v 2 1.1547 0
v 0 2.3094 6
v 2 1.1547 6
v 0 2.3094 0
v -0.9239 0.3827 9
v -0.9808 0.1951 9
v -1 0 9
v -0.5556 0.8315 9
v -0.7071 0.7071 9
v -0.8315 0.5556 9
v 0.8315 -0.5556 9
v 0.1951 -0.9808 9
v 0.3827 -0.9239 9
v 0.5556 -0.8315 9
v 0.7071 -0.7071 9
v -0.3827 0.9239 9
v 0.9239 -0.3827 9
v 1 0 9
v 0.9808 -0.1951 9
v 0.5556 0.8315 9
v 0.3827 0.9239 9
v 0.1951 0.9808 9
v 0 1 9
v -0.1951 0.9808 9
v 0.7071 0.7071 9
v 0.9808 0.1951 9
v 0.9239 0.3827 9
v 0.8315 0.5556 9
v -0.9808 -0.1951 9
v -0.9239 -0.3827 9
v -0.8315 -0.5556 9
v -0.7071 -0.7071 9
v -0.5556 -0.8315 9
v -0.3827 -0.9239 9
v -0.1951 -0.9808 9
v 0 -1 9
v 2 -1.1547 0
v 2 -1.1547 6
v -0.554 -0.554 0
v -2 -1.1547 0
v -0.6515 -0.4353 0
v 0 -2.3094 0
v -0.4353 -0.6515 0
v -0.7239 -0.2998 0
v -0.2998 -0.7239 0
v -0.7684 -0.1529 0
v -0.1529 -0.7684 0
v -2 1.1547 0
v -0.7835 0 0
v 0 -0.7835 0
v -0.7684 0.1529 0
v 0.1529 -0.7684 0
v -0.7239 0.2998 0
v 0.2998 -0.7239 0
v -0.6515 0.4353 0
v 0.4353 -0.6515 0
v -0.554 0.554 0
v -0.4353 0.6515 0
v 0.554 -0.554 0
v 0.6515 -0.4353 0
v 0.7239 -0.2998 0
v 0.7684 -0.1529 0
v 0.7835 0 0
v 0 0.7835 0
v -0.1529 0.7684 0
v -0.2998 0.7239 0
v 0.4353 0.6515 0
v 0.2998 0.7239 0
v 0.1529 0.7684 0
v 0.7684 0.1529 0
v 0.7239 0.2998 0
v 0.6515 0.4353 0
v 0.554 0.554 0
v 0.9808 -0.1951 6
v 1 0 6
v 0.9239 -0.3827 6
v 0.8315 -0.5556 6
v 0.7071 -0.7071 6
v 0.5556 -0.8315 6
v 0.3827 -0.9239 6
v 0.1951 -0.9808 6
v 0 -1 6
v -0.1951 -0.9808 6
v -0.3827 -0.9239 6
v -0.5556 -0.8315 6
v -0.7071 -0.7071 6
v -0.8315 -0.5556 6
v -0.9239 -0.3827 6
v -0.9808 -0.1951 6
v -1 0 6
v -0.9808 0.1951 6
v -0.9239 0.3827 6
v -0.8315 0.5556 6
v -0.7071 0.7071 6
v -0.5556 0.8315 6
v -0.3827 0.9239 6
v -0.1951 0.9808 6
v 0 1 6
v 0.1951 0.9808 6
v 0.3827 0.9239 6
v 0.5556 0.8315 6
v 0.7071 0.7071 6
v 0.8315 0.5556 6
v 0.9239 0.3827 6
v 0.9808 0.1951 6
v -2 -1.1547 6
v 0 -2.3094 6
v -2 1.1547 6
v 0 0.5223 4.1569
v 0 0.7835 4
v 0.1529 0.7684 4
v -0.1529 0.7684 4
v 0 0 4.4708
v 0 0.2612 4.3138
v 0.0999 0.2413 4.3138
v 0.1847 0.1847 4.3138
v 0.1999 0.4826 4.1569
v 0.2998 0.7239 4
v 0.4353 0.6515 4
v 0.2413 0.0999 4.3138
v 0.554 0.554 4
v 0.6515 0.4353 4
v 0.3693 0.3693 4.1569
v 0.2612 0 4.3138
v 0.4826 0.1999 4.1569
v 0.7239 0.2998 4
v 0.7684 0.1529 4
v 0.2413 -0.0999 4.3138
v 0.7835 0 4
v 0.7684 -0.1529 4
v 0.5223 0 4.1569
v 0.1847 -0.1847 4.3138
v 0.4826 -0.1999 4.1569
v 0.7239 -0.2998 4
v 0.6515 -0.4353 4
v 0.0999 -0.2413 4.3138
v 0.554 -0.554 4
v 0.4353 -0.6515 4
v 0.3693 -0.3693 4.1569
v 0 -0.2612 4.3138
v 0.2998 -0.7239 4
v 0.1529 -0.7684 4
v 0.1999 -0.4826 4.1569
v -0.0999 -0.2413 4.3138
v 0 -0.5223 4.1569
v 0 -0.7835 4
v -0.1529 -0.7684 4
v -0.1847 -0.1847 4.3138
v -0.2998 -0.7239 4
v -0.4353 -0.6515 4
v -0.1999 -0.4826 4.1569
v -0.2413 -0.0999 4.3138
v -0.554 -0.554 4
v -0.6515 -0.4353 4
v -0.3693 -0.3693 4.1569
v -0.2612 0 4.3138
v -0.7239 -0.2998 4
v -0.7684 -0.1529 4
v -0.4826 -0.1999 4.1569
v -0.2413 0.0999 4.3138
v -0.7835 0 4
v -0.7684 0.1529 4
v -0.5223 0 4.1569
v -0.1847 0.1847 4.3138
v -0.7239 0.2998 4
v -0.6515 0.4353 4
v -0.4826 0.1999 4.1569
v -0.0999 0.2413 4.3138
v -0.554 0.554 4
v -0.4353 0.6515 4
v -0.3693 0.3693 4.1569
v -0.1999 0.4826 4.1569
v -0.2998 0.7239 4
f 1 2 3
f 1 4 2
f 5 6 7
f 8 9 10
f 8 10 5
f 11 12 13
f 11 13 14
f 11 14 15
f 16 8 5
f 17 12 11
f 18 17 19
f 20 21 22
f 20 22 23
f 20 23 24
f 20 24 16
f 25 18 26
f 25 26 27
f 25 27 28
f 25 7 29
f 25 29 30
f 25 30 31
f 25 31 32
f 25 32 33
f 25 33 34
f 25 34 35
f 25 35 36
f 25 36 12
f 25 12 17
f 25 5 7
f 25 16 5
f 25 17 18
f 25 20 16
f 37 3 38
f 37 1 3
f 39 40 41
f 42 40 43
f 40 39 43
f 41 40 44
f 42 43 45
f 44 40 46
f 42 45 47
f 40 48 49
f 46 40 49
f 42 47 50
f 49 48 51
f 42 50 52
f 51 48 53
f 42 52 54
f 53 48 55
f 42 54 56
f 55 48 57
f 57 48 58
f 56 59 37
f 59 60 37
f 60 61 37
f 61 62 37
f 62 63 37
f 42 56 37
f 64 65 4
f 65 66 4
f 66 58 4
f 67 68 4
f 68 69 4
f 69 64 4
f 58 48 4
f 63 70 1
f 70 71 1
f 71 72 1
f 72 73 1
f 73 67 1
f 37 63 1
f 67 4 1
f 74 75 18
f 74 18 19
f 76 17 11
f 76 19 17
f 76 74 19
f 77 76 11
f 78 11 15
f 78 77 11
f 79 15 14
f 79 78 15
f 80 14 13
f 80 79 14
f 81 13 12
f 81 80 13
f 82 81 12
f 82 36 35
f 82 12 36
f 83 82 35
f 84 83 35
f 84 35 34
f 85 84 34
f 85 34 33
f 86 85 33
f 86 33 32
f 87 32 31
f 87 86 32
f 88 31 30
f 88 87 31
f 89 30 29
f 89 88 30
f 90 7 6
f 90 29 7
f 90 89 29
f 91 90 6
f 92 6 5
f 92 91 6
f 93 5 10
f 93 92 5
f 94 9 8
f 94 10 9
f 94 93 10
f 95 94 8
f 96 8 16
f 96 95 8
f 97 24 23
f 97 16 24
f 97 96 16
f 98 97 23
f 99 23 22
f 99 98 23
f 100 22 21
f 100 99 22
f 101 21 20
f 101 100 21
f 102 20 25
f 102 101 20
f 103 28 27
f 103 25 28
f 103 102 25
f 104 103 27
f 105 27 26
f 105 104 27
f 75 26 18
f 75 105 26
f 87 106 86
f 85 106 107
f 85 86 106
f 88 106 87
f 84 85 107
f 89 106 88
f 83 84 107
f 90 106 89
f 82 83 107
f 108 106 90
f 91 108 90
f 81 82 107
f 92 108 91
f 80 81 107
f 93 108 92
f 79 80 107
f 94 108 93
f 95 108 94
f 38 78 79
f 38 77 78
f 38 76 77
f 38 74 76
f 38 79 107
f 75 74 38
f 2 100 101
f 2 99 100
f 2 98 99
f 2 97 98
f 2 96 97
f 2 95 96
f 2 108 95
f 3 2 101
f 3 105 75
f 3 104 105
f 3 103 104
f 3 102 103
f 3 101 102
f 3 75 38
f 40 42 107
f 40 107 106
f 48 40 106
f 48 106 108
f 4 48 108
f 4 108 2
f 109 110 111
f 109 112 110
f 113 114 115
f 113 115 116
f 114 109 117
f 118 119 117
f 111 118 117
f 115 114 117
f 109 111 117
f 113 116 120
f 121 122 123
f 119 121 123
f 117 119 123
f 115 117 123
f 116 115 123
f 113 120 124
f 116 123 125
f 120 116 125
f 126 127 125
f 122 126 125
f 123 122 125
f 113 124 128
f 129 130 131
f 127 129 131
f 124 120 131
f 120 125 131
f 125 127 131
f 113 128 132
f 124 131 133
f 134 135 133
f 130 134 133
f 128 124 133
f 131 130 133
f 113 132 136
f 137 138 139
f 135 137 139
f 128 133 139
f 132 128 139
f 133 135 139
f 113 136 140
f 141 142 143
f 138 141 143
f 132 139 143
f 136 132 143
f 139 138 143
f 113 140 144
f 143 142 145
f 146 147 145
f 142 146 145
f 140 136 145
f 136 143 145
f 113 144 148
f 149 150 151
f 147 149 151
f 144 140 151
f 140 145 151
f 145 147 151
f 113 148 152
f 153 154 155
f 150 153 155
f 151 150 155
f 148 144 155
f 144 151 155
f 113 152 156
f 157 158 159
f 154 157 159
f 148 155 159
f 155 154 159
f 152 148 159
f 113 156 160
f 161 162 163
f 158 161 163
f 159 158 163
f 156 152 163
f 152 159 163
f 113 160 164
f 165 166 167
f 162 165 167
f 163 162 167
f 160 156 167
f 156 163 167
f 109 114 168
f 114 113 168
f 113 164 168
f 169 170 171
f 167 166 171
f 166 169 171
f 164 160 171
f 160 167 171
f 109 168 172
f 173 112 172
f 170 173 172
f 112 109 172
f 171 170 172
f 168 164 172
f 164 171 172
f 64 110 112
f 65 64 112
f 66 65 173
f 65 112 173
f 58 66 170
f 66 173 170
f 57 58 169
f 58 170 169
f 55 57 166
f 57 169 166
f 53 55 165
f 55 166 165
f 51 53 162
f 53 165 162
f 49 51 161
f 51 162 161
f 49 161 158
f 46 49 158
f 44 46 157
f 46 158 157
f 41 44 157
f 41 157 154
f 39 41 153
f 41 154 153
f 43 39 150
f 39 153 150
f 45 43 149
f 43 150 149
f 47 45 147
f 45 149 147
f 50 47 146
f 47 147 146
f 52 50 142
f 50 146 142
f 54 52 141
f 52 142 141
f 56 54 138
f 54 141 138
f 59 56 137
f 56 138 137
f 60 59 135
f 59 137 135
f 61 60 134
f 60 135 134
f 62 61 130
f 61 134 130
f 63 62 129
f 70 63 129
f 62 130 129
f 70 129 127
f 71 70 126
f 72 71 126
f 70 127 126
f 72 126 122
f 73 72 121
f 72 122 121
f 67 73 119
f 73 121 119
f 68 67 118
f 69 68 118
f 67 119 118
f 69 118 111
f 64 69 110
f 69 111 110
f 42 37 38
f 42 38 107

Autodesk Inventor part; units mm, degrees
ref_plane "YZ Plane" through (0, 0, 0) normal (1, 0, 0) x (0, 1, 0)
ref_plane "XZ Plane" through (0, 0, 0) normal (0, 1, 0) x (-1, 0, 0)
ref_plane "XY Plane" through (0, 0, 0) normal (0, 0, 1) x (1, 0, 0)
sketch "スケッチ1" plane through (0, 0, 0) normal (0, 0, 1) x (1, 0, 0)
  line L0 (0, 2.3094) -> (2, 1.1547)
  line L1 (2, 1.1547) -> (2, -1.1547)
  line L2 (2, -1.1547) -> (0, -2.3094)
  line L3 (0, -2.3094) -> (-2, -1.1547)
  line L4 (-2, -1.1547) -> (-2, 1.1547)
  line L5 (-2, 1.1547) -> (0, 2.3094)
  point P0 (0, 0)
  point P1 (0, 0)
  dimension "d0" = 4
extrude "押し出し1" add sketch "スケッチ1" along normal blind 6
sketch "スケッチ2" plane through (0, 0, 6) normal (0, 0, 1) x (1, 0, 0)
  circle A0 centre (0, 0) radius 1
  dimension "d3" = 2
extrude "押し出し2" add sketch "スケッチ2" along normal blind 3
thread "ねじ1" size "M2x0.4" class "6g" standard "ANSI Metric M Profile" full length
sketch "スケッチ3" plane through (0, 0, 0) normal (0, 0, -1) x (-1, 0, 0)
  point P0 (0, 0)
hole "穴1" at (0, 0, 0) direction (0, 0, 1) diameter 1.567 depth 4 tip angle 118 thread size "M2x0.4" class "6H" standard "ISO Metric profile"
properties part number "ジュラコンスペーサー（六角・短間段重ね用）_MS-2006-03E" material "アセタール樹脂、白"
